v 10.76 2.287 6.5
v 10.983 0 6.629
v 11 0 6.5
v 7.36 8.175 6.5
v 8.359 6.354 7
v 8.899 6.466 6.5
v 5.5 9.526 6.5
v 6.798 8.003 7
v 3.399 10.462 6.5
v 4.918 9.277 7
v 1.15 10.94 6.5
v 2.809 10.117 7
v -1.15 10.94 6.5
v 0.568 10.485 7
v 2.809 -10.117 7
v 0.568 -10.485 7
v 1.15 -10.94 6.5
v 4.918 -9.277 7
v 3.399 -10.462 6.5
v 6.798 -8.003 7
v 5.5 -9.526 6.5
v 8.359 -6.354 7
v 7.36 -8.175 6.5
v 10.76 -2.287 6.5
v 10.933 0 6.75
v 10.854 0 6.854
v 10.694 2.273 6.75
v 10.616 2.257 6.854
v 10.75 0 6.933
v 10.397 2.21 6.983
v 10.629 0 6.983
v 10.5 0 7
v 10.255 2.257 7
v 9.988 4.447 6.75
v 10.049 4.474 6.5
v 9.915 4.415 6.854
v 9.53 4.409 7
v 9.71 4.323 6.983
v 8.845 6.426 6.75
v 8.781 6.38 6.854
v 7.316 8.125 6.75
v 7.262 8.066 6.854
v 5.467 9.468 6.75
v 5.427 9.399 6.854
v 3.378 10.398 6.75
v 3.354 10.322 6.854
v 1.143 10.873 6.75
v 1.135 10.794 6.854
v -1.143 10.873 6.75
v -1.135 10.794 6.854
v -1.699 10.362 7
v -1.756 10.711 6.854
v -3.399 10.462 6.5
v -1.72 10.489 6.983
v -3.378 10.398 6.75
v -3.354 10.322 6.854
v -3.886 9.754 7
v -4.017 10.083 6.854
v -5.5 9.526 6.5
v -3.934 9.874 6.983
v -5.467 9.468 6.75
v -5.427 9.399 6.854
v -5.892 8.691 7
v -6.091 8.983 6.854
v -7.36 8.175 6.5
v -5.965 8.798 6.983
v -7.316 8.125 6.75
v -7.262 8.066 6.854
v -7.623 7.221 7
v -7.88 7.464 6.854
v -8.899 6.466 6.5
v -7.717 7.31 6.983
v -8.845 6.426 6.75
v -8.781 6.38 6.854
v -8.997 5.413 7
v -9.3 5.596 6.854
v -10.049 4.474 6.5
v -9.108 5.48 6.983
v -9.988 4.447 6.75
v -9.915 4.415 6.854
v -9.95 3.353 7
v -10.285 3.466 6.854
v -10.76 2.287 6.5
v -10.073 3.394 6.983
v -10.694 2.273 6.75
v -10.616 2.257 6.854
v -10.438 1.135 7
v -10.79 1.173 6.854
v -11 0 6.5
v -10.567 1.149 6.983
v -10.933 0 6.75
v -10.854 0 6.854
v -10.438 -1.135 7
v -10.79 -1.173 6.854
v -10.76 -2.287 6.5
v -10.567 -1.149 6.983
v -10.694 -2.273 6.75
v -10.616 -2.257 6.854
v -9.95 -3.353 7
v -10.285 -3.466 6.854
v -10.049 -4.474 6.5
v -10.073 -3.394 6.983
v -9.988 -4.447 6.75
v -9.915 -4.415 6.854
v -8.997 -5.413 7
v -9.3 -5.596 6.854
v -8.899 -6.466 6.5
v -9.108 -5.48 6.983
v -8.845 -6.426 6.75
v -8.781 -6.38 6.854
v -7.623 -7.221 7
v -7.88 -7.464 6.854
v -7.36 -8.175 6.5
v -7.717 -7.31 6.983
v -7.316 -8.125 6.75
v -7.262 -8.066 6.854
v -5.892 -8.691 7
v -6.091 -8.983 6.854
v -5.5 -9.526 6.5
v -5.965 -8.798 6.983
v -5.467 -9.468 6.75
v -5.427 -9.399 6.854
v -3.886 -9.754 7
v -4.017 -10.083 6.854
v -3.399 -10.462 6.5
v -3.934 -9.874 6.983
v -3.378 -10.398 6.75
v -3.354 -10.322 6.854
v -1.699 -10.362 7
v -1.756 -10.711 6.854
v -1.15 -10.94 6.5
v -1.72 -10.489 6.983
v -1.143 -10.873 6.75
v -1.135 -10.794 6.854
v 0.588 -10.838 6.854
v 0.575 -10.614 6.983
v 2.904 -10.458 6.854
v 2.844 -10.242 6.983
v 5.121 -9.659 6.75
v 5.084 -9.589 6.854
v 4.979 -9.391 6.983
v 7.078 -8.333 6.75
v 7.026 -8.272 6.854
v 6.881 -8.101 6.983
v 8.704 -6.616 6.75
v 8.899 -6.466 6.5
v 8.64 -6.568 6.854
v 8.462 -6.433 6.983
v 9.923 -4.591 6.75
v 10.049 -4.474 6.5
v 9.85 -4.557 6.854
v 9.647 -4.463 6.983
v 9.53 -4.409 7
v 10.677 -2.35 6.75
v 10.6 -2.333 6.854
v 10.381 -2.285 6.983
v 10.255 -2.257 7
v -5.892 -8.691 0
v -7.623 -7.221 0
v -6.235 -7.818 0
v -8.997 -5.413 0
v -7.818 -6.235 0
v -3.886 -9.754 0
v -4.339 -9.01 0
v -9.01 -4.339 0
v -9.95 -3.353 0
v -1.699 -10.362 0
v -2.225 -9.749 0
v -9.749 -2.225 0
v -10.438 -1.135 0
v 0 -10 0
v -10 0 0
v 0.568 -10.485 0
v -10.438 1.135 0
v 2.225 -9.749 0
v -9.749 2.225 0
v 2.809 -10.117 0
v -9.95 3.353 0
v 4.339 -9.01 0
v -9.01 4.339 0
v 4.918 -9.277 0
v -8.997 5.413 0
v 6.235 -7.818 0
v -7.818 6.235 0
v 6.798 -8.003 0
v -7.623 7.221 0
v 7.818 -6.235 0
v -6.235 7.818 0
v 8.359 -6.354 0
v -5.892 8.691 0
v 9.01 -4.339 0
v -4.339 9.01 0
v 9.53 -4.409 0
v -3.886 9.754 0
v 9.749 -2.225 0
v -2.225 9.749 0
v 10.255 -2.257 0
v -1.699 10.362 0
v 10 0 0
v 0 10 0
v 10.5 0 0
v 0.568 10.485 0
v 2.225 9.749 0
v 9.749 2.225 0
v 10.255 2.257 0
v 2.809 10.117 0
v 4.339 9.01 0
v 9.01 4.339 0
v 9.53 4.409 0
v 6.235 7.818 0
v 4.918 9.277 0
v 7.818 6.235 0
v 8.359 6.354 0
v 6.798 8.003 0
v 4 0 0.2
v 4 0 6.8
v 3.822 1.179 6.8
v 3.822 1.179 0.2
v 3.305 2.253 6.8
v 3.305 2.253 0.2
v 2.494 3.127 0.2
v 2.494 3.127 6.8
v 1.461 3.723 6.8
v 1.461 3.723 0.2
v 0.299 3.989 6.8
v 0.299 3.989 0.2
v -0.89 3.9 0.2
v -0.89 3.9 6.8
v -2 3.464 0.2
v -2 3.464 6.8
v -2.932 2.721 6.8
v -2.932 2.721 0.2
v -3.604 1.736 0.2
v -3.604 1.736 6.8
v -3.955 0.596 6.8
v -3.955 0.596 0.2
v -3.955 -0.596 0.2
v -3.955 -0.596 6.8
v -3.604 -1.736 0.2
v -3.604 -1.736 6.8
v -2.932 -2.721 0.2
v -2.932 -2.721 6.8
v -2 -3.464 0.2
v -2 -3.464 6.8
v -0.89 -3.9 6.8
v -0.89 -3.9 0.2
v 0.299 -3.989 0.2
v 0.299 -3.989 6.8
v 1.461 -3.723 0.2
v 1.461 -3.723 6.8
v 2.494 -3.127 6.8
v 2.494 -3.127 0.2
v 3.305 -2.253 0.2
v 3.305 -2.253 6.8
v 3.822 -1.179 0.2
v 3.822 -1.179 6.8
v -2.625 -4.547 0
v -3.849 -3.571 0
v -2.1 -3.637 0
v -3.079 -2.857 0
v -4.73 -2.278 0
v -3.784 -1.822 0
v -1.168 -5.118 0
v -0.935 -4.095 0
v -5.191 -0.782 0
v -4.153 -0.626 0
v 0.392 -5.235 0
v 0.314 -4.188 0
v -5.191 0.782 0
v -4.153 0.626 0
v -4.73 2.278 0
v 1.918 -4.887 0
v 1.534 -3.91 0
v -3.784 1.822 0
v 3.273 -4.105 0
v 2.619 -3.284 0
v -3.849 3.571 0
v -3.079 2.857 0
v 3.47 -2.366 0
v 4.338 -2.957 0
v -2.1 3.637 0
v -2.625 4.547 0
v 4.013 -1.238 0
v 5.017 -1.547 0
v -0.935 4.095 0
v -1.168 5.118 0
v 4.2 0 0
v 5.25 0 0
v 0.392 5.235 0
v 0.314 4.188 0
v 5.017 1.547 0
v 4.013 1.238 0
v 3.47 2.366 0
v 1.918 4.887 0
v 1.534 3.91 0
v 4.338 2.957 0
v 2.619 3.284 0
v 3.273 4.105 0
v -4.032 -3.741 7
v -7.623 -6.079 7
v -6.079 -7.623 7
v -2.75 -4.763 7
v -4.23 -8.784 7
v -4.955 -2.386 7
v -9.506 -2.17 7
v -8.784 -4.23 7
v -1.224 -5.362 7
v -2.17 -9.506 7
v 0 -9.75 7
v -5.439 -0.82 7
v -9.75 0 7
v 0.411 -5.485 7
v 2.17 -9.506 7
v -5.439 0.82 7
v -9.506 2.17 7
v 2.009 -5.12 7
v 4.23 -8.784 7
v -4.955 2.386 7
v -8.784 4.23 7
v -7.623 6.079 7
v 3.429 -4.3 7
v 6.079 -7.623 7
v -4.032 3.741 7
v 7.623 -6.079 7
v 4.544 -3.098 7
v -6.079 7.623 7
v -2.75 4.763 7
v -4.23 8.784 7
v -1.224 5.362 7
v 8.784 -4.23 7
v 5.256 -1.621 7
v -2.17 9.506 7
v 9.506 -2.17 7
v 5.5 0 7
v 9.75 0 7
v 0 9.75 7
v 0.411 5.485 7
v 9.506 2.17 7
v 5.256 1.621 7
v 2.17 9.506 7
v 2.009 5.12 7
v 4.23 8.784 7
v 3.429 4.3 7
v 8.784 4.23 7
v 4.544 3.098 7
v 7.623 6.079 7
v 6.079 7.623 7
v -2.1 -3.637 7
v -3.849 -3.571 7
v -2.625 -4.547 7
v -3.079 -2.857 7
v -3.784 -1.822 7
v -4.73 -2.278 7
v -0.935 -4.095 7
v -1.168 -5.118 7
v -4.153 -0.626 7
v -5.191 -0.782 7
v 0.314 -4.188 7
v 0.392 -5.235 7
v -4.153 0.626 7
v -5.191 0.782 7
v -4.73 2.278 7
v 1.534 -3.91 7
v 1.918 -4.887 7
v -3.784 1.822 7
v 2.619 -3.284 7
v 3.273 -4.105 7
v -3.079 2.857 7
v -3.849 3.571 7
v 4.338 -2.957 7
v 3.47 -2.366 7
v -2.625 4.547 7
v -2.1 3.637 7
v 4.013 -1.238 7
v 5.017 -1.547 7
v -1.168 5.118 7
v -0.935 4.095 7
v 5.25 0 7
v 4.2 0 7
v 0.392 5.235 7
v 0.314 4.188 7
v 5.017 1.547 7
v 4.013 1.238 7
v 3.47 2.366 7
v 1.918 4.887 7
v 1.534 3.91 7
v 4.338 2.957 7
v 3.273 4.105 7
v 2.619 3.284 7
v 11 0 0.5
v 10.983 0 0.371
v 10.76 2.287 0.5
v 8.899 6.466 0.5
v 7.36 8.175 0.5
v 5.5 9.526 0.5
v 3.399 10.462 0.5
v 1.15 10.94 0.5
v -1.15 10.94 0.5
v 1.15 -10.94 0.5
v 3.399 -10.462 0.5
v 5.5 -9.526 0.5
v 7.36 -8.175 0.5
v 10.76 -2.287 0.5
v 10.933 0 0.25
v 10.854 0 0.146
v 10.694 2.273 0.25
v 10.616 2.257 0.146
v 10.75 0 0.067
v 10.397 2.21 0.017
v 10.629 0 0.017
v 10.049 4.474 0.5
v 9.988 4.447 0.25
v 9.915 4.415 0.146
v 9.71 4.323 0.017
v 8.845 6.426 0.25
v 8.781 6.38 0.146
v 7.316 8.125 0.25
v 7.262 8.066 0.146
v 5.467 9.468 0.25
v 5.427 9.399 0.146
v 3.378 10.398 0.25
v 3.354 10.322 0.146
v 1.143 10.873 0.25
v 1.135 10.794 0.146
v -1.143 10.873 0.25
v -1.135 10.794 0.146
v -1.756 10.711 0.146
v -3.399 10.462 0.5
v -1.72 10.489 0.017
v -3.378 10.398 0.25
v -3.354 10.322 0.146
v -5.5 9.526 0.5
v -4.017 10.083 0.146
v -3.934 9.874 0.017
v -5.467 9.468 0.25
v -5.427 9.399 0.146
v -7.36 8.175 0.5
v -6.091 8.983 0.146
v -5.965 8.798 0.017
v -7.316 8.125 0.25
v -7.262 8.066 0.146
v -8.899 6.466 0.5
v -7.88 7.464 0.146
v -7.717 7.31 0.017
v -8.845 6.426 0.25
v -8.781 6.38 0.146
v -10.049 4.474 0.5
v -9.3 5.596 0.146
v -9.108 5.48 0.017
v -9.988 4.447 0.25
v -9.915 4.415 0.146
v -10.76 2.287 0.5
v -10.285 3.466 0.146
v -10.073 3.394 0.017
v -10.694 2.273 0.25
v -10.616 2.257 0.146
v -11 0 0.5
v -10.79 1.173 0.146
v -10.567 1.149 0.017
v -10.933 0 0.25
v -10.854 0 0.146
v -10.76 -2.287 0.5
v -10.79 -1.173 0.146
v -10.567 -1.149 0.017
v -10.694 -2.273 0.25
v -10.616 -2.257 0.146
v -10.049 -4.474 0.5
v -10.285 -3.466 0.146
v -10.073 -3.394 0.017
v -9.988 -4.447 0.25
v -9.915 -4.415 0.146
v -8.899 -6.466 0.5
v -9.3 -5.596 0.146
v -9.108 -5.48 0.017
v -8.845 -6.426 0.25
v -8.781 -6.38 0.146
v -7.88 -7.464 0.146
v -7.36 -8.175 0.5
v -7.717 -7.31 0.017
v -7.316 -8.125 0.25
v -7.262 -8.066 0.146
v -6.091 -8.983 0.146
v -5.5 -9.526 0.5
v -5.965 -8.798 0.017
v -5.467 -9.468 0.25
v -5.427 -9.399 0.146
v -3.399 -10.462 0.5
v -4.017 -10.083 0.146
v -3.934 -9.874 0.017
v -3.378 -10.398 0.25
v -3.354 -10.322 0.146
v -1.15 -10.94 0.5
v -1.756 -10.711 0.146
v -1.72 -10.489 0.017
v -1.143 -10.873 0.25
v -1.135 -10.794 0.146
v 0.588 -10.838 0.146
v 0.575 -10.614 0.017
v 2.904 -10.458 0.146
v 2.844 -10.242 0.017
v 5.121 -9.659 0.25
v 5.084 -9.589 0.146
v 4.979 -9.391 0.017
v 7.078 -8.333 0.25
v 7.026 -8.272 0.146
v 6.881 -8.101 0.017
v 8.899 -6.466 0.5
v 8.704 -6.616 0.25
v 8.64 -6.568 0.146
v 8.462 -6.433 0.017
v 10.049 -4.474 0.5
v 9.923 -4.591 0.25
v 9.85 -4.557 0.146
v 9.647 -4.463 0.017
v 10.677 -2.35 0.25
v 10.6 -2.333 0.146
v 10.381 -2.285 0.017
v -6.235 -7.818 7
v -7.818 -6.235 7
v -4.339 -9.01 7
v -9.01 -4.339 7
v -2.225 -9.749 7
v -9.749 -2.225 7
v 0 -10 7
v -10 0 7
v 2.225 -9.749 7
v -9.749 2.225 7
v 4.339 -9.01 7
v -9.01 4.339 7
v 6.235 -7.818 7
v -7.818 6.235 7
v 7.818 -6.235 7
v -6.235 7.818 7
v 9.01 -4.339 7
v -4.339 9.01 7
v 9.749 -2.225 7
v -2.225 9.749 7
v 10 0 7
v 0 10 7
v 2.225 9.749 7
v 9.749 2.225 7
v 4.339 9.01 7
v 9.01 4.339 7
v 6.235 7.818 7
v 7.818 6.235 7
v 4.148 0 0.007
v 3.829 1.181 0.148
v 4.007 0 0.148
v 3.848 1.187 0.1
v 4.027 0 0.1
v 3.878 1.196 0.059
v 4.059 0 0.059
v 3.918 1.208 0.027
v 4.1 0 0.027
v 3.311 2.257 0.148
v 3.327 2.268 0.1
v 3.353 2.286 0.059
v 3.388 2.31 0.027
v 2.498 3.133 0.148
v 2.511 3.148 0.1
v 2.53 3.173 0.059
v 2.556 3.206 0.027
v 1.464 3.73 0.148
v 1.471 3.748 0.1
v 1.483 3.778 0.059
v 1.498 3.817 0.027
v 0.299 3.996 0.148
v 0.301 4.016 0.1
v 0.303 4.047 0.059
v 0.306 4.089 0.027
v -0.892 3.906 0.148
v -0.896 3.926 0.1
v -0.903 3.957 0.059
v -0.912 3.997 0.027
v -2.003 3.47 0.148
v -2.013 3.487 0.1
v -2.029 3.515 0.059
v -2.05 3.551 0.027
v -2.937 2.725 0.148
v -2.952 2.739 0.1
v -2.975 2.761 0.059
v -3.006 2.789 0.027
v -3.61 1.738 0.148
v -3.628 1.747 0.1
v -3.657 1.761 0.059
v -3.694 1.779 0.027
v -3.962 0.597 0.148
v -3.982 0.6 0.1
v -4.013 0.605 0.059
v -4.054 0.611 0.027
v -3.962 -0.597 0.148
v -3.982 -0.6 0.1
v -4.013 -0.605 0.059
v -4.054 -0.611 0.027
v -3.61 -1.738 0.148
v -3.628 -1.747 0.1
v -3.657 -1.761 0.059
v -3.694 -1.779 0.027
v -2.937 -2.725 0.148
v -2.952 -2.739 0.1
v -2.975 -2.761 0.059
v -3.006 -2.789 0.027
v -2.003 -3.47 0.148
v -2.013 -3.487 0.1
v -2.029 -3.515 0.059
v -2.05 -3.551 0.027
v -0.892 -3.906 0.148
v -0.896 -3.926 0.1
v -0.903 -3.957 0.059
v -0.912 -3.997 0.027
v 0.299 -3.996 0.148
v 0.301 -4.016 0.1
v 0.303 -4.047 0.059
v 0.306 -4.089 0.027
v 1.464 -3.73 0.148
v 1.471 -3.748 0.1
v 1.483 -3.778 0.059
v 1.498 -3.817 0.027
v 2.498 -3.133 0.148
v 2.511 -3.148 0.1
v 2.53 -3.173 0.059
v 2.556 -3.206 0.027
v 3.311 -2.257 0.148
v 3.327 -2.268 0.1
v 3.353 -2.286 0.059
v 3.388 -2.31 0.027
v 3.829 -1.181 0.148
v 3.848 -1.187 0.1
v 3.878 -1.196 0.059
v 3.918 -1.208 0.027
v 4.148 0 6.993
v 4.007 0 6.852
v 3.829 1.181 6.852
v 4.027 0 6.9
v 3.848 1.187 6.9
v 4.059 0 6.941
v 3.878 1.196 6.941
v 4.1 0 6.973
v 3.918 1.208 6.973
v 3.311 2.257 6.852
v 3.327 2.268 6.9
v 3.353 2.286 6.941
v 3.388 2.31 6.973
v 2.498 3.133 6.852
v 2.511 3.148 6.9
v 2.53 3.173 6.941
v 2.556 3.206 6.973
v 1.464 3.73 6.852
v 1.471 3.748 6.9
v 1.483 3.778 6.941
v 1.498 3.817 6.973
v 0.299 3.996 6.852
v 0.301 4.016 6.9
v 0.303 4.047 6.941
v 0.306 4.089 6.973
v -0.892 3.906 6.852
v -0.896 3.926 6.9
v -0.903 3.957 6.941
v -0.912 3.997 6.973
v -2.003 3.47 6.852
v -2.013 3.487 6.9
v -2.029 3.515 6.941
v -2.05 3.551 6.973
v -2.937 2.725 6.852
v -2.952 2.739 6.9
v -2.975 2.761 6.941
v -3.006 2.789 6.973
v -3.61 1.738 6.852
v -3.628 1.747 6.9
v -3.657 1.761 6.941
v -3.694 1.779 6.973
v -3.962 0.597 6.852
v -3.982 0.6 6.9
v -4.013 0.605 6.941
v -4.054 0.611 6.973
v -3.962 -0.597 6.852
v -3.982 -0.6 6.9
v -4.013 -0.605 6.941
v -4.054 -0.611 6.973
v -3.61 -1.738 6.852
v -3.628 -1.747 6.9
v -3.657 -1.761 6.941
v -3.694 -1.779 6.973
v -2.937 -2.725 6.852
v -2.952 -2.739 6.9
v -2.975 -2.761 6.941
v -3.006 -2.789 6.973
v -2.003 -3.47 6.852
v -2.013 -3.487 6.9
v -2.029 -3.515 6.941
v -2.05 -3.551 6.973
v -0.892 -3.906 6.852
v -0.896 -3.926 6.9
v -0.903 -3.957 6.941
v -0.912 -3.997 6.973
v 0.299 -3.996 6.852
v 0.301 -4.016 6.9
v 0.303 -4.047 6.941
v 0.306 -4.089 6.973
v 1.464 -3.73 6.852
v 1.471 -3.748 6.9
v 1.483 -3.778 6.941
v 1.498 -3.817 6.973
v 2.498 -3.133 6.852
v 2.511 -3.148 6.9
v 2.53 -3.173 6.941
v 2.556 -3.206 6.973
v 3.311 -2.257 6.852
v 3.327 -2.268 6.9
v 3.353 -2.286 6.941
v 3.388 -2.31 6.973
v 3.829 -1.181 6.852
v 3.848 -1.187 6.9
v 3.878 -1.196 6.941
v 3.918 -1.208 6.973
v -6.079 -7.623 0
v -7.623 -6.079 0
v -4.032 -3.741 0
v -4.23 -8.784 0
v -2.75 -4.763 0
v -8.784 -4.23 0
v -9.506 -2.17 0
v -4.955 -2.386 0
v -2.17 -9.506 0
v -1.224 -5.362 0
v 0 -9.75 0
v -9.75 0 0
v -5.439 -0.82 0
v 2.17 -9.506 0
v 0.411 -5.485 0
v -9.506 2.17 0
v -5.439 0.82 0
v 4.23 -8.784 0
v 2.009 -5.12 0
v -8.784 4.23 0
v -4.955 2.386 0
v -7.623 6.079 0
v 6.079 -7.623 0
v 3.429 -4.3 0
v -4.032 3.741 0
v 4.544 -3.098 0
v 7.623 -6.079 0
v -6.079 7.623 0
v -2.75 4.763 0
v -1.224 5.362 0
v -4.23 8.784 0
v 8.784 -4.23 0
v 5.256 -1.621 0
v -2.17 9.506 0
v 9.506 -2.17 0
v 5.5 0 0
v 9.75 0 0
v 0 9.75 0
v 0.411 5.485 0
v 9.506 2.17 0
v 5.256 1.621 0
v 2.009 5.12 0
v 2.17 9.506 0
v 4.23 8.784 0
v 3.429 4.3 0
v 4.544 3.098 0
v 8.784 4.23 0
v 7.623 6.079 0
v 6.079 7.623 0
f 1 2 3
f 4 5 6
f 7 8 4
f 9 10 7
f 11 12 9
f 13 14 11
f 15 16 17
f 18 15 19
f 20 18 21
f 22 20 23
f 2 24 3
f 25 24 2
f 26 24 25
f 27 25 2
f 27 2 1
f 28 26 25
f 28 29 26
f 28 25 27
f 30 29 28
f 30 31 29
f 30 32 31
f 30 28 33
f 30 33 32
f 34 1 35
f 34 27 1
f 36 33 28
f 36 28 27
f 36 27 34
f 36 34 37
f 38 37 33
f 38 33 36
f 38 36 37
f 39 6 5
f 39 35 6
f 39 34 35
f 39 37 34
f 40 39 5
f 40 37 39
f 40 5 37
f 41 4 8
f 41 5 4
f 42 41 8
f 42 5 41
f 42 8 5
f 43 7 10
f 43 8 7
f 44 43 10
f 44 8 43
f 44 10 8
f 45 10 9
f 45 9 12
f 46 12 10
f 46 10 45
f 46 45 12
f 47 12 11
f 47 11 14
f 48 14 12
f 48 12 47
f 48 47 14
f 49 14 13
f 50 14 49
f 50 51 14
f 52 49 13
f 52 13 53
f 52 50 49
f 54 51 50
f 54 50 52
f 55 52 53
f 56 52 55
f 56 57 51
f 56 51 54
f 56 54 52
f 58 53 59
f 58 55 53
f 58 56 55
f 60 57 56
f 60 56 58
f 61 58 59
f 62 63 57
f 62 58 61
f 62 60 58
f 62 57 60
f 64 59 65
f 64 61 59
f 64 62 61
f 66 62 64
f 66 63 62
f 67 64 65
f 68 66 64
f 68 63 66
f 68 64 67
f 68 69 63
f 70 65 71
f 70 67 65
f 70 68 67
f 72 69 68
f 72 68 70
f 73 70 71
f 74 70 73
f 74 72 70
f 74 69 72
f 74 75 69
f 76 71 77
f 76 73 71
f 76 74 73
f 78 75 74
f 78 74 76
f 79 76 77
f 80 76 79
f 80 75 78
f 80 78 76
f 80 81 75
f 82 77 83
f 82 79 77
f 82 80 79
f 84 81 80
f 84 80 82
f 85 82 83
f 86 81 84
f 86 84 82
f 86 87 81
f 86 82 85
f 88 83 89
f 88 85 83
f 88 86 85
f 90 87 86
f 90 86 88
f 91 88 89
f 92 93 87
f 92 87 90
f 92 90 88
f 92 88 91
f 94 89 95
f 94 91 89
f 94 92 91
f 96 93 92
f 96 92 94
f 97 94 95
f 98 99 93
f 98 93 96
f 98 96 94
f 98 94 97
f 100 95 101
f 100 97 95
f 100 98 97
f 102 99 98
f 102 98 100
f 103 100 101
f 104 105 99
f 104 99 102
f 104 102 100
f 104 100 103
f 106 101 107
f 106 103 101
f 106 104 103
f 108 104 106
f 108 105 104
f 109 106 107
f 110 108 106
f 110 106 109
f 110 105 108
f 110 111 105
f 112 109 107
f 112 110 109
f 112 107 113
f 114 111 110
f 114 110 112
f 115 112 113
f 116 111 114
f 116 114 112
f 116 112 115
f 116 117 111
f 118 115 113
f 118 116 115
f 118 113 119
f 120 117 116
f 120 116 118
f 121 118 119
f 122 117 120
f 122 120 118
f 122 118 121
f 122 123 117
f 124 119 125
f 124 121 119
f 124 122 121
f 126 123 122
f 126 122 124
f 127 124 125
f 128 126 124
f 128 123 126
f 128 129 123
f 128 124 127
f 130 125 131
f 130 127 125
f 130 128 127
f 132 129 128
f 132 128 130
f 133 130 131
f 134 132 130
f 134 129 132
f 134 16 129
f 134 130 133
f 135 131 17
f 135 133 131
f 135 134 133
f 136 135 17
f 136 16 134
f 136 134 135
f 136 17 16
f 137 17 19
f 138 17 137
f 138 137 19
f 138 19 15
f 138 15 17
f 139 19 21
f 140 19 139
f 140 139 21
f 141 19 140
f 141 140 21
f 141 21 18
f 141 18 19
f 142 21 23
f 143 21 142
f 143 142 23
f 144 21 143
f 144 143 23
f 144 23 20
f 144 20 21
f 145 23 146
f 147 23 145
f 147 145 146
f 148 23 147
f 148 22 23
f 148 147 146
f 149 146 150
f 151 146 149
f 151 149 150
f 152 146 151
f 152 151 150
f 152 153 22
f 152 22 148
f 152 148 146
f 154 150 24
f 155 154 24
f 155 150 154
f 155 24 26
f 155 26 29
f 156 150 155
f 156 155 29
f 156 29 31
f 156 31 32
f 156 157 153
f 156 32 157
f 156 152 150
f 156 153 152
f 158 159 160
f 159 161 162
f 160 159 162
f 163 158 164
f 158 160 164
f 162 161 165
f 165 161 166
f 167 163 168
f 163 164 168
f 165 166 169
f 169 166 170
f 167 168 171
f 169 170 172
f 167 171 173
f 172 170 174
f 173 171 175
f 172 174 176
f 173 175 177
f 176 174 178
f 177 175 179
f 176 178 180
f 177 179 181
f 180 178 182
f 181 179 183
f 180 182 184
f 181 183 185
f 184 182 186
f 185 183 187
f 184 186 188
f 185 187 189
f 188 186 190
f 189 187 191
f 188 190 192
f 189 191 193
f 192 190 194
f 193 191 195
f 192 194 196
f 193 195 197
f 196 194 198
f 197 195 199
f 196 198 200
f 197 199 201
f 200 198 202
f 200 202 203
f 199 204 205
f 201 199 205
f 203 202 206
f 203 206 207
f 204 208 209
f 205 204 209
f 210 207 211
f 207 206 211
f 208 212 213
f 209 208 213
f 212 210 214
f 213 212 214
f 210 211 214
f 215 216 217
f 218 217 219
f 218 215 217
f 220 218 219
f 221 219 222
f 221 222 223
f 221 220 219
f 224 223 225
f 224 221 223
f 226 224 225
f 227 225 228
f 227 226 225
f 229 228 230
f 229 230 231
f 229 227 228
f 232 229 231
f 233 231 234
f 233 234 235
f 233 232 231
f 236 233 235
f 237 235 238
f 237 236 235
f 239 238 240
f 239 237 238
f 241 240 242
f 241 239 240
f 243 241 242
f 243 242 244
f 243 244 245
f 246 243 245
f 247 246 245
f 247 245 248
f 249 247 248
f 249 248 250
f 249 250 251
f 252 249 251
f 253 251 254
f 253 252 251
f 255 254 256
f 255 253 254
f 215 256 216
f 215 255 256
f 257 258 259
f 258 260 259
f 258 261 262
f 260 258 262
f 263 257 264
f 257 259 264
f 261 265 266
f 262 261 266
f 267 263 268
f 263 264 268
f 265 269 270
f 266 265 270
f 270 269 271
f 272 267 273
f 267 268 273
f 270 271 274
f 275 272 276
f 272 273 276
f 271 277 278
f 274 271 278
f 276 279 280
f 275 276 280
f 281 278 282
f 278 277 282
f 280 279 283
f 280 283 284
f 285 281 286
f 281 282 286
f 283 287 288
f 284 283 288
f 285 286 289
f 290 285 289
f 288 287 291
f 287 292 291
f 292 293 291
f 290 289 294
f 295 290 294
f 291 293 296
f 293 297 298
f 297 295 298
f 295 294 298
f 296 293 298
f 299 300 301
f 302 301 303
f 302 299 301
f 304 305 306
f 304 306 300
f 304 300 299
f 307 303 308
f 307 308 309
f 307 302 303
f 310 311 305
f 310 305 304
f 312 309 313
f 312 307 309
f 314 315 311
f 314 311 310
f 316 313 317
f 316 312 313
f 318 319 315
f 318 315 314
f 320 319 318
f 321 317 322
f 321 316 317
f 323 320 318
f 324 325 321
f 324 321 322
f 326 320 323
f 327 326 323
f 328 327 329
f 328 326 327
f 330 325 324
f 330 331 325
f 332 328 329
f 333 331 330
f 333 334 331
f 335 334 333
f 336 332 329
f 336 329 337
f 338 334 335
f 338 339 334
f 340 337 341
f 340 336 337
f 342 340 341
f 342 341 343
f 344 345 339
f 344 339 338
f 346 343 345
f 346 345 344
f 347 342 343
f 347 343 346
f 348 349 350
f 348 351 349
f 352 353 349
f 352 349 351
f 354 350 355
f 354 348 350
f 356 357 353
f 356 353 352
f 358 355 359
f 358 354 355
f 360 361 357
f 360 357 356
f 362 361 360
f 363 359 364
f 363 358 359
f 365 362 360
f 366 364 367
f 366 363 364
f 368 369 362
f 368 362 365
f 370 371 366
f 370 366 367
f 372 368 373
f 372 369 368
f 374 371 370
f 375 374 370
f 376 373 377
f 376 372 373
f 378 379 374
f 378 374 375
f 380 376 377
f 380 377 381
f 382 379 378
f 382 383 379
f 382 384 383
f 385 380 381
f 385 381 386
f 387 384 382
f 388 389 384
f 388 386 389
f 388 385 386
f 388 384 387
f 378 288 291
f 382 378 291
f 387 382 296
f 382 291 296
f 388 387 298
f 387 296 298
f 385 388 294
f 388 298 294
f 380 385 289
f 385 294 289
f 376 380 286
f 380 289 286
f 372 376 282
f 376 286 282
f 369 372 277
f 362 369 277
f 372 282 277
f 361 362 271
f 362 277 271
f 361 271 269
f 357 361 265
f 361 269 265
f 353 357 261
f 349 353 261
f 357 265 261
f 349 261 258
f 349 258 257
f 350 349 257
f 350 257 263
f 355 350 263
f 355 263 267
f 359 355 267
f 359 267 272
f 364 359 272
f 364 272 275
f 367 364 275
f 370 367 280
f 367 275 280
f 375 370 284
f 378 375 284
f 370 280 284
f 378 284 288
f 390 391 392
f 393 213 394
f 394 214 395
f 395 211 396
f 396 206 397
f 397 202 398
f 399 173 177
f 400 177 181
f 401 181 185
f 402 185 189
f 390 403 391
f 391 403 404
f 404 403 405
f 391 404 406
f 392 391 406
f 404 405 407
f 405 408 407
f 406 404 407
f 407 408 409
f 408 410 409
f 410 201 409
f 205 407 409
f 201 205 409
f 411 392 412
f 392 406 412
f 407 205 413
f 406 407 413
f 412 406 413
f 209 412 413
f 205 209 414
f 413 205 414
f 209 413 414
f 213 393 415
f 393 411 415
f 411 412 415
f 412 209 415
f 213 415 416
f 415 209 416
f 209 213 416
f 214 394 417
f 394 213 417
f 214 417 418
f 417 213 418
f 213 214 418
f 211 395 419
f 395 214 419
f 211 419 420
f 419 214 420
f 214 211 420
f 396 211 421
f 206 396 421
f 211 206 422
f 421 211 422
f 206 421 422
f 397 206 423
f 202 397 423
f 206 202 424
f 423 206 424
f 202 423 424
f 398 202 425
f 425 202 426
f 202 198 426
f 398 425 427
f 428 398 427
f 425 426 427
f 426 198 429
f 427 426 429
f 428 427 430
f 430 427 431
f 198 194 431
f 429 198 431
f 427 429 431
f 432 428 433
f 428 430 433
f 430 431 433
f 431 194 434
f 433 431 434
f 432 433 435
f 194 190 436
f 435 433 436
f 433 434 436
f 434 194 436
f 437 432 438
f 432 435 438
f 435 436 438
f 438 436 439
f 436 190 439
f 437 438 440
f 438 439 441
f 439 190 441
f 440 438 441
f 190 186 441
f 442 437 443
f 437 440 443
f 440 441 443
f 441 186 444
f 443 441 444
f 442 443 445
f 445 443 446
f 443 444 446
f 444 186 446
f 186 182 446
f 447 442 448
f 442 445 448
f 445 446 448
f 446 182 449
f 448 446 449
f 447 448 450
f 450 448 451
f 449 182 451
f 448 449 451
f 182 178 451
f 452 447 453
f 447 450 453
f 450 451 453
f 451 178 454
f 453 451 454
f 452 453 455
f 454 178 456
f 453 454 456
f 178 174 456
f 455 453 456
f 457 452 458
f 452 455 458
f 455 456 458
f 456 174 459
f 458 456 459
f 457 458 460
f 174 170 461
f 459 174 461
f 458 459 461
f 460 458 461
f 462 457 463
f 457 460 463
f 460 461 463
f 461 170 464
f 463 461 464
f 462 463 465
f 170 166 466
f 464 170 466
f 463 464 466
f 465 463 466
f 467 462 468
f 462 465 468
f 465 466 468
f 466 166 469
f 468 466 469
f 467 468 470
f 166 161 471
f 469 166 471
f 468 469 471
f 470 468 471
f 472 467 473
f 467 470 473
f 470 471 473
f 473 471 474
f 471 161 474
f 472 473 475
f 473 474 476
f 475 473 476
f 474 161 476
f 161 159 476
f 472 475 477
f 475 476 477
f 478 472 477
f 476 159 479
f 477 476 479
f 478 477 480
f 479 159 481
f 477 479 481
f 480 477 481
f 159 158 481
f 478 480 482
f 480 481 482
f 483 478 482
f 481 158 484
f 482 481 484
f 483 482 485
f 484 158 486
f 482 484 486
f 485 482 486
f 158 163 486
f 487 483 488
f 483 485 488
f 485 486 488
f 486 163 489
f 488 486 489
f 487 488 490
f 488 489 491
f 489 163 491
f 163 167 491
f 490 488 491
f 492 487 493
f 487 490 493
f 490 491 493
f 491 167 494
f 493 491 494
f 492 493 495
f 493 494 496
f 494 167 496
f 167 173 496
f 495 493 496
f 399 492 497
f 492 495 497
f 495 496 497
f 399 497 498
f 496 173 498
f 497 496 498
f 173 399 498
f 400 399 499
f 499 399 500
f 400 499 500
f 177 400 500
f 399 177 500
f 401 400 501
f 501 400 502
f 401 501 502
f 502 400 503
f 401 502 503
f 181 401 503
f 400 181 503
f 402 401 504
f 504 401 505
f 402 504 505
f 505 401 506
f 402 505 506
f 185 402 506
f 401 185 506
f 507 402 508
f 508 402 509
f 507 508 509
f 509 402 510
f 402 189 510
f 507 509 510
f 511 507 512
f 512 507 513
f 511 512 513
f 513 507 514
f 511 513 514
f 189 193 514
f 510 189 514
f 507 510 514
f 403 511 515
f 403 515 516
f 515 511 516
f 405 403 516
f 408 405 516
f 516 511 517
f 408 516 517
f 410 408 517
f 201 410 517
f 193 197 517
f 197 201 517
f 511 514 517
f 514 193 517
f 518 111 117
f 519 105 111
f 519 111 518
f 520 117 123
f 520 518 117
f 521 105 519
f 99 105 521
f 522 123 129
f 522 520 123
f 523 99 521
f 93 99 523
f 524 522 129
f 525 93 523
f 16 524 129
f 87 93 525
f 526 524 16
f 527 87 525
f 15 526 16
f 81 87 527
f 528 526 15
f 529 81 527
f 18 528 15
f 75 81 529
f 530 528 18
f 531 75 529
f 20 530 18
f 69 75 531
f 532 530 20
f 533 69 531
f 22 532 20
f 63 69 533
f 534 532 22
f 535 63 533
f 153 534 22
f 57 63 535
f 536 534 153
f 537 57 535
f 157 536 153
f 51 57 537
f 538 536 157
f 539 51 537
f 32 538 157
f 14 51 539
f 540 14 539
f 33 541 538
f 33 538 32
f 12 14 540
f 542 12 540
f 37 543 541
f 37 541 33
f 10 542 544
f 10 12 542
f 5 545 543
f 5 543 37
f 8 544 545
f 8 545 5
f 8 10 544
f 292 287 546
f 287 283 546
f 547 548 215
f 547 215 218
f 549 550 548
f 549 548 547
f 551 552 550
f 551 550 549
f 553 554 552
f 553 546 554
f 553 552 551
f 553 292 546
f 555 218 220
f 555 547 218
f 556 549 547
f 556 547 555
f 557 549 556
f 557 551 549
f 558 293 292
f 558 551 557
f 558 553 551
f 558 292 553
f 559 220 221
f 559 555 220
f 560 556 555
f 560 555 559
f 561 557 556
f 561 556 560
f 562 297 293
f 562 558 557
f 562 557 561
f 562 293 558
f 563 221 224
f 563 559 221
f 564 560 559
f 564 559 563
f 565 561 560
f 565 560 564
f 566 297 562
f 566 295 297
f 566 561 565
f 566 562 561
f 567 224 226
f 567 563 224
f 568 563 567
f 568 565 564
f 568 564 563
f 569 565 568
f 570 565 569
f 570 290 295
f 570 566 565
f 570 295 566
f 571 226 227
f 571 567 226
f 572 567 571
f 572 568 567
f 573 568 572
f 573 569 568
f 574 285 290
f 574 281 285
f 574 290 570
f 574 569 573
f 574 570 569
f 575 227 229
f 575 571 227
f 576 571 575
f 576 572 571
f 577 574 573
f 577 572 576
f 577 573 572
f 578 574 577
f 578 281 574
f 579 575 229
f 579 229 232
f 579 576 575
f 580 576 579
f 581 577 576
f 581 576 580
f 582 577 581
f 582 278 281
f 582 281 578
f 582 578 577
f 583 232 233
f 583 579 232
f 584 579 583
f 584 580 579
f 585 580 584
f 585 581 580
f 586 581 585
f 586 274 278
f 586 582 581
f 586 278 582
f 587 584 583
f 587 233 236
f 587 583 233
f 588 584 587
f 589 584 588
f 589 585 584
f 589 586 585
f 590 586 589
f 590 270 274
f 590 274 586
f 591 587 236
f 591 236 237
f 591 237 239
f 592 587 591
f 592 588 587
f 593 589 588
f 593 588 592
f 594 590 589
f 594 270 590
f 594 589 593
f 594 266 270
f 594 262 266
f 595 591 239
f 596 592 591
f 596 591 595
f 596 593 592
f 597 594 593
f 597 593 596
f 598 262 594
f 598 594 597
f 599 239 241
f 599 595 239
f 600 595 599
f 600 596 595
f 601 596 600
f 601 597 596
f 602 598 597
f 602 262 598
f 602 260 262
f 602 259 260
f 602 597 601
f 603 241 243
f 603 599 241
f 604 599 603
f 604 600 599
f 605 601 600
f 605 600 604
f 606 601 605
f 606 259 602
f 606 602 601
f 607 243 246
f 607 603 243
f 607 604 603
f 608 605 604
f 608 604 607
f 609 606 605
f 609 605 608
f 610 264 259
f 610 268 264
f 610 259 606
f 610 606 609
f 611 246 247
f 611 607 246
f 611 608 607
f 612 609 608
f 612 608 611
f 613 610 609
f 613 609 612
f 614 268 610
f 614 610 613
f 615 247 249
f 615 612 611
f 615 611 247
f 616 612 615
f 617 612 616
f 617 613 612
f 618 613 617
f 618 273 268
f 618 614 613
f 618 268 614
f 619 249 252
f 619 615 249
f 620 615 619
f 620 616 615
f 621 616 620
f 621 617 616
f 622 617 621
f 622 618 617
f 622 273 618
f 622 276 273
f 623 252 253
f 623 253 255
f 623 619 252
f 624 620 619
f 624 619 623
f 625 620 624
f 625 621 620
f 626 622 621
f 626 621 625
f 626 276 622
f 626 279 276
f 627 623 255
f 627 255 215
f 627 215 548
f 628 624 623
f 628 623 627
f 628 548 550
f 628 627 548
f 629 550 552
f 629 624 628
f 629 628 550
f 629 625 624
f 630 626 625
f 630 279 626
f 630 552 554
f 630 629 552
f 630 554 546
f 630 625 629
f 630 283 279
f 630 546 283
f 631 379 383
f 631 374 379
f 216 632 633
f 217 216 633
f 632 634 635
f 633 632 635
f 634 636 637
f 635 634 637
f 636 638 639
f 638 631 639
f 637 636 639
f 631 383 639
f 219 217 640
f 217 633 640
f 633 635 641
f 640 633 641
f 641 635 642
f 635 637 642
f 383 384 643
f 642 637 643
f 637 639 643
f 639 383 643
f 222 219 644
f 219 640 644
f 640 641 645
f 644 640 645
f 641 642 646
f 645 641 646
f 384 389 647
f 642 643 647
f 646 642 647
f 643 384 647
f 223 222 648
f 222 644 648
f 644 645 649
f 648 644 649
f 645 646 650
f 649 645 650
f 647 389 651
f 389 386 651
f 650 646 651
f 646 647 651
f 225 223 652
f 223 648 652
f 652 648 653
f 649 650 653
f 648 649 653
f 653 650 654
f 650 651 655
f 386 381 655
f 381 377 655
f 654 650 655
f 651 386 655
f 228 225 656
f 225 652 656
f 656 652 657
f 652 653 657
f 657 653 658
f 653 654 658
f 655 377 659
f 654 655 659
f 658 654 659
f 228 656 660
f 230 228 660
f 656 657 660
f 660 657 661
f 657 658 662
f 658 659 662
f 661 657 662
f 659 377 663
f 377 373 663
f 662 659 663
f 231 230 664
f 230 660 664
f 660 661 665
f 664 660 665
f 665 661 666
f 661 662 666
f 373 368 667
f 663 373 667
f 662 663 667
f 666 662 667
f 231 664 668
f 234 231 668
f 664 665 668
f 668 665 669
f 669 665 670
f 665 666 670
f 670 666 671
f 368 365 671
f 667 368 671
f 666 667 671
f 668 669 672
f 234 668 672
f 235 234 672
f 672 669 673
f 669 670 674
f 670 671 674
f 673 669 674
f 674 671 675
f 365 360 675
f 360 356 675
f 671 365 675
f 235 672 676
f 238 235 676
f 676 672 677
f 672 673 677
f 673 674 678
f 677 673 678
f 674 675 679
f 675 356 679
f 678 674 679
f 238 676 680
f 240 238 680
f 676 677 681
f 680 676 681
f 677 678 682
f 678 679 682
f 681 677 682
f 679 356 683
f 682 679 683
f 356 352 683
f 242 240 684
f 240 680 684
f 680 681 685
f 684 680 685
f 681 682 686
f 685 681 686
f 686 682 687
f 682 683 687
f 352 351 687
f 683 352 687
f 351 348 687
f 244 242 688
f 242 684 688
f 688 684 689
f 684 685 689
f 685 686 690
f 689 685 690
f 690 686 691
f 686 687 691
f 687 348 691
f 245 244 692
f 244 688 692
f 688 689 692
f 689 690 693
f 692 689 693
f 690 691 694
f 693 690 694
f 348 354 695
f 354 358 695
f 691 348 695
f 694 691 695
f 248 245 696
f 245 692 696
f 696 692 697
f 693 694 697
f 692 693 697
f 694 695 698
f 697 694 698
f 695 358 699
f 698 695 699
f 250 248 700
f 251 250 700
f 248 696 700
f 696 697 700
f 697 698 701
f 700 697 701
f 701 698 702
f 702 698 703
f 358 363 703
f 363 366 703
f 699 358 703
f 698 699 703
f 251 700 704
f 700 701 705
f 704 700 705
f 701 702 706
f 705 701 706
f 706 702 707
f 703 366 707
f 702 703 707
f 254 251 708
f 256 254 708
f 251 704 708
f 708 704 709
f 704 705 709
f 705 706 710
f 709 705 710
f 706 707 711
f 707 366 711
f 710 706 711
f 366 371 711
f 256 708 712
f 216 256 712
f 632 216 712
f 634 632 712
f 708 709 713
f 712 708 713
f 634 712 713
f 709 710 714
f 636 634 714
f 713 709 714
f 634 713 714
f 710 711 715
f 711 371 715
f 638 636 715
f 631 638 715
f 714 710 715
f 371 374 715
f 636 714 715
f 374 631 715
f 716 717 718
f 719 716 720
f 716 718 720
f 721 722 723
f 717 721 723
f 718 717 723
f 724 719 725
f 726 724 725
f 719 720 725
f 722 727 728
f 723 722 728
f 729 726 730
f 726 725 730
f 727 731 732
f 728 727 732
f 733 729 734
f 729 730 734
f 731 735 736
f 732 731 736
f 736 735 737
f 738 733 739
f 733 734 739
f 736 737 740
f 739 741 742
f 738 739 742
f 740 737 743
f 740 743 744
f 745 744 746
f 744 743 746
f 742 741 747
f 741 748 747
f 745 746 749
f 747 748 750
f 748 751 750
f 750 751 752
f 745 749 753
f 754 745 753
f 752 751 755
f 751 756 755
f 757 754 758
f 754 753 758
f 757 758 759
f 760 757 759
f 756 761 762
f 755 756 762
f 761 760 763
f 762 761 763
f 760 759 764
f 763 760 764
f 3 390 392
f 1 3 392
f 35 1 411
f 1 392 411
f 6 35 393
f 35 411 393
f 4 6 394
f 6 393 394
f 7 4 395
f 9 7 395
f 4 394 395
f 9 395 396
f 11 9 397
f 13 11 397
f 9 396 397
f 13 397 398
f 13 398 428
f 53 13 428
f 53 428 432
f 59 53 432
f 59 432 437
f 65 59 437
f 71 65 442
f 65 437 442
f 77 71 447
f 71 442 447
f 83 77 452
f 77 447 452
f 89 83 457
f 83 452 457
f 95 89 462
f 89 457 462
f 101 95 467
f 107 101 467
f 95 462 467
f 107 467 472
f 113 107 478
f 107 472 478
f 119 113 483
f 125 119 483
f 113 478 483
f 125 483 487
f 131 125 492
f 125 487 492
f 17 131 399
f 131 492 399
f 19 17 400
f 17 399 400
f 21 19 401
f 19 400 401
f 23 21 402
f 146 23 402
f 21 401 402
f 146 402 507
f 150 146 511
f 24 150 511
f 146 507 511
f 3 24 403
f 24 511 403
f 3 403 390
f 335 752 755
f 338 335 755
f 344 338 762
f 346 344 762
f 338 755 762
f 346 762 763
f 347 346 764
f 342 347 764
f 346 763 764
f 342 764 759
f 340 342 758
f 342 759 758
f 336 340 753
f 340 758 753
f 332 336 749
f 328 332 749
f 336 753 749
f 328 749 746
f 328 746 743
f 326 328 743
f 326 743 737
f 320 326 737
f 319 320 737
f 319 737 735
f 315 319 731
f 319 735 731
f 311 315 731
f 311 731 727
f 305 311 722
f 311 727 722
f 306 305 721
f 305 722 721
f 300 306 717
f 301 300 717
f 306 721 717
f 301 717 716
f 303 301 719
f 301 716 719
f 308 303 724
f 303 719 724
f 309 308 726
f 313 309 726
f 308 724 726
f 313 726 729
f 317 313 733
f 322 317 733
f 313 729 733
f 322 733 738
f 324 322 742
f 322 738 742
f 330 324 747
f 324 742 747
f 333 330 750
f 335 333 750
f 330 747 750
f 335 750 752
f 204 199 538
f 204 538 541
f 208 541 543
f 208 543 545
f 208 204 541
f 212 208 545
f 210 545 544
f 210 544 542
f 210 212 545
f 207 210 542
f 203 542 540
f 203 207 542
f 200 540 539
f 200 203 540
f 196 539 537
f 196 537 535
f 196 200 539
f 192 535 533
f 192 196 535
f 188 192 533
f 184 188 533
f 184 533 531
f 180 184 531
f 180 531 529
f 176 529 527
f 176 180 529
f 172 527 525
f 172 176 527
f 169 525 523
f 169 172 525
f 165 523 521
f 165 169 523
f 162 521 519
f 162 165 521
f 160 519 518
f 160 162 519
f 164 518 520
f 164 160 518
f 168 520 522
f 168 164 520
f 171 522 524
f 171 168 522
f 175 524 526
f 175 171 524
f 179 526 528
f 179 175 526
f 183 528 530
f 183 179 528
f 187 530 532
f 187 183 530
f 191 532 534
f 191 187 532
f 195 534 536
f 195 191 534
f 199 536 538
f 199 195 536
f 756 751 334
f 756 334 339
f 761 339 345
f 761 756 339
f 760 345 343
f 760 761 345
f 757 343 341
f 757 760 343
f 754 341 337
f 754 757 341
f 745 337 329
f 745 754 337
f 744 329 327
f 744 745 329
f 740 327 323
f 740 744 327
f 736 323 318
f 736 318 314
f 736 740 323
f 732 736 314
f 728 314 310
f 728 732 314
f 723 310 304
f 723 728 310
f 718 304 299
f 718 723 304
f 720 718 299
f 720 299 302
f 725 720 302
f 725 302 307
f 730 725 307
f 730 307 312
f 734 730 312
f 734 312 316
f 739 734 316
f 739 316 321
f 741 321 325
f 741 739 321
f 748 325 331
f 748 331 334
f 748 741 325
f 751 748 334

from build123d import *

# Parameters (mm, degrees)
CROQUIS1_R                = 9.75
CROQUIS1_R_2              = 5.5
SALIENTE_EXTRUIR1_DEPTH   = 7
CROQUIS1_R_3              = 5.25
CROQUIS1_R_4              = 4
SALIENTE_EXTRUIR1_2_DEPTH = 7
CROQUIS1_R_5              = 11
CROQUIS1_R_6              = 10
SALIENTE_EXTRUIR1_3_DEPTH = 7
REDONDEO1_R               = 0.2
REDONDEO2_R               = 0.5


with BuildPart() as part:
    # Croquis1 → Saliente-Extruir1 (new body)
    with BuildSketch(Plane.XY):
        Circle(CROQUIS1_R)
        Circle(CROQUIS1_R_2, mode=Mode.SUBTRACT)
    extrude(amount=SALIENTE_EXTRUIR1_DEPTH)


with BuildPart() as body_2:
    # Croquis1 → Saliente-Extruir1 2 (new body)
    with BuildSketch(Plane.XY):
        Circle(CROQUIS1_R_3)
        Circle(CROQUIS1_R_4, mode=Mode.SUBTRACT)
    extrude(amount=SALIENTE_EXTRUIR1_2_DEPTH)

    # Redondeo1
    redondeo1_edges = [body_2.edges().sort_by_distance(p)[0] for p in [
        (-4, 0, 0),
        (-4, 0, 7),
    ]]
    fillet(redondeo1_edges, radius=REDONDEO1_R)


with BuildPart() as body_3:
    # Croquis1 → Saliente-Extruir1 3 (new body)
    with BuildSketch(Plane.XY):
        Circle(CROQUIS1_R_5)
        Circle(CROQUIS1_R_6, mode=Mode.SUBTRACT)
    extrude(amount=SALIENTE_EXTRUIR1_3_DEPTH)

    # Redondeo2
    redondeo2_edges = [body_3.edges().sort_by_distance(p)[0] for p in [
        (-11, 0, 7),
        (-11, 0, 0),
    ]]
    fillet(redondeo2_edges, radius=REDONDEO2_R)


solid = Compound([part.part, body_2.part, body_3.part])
